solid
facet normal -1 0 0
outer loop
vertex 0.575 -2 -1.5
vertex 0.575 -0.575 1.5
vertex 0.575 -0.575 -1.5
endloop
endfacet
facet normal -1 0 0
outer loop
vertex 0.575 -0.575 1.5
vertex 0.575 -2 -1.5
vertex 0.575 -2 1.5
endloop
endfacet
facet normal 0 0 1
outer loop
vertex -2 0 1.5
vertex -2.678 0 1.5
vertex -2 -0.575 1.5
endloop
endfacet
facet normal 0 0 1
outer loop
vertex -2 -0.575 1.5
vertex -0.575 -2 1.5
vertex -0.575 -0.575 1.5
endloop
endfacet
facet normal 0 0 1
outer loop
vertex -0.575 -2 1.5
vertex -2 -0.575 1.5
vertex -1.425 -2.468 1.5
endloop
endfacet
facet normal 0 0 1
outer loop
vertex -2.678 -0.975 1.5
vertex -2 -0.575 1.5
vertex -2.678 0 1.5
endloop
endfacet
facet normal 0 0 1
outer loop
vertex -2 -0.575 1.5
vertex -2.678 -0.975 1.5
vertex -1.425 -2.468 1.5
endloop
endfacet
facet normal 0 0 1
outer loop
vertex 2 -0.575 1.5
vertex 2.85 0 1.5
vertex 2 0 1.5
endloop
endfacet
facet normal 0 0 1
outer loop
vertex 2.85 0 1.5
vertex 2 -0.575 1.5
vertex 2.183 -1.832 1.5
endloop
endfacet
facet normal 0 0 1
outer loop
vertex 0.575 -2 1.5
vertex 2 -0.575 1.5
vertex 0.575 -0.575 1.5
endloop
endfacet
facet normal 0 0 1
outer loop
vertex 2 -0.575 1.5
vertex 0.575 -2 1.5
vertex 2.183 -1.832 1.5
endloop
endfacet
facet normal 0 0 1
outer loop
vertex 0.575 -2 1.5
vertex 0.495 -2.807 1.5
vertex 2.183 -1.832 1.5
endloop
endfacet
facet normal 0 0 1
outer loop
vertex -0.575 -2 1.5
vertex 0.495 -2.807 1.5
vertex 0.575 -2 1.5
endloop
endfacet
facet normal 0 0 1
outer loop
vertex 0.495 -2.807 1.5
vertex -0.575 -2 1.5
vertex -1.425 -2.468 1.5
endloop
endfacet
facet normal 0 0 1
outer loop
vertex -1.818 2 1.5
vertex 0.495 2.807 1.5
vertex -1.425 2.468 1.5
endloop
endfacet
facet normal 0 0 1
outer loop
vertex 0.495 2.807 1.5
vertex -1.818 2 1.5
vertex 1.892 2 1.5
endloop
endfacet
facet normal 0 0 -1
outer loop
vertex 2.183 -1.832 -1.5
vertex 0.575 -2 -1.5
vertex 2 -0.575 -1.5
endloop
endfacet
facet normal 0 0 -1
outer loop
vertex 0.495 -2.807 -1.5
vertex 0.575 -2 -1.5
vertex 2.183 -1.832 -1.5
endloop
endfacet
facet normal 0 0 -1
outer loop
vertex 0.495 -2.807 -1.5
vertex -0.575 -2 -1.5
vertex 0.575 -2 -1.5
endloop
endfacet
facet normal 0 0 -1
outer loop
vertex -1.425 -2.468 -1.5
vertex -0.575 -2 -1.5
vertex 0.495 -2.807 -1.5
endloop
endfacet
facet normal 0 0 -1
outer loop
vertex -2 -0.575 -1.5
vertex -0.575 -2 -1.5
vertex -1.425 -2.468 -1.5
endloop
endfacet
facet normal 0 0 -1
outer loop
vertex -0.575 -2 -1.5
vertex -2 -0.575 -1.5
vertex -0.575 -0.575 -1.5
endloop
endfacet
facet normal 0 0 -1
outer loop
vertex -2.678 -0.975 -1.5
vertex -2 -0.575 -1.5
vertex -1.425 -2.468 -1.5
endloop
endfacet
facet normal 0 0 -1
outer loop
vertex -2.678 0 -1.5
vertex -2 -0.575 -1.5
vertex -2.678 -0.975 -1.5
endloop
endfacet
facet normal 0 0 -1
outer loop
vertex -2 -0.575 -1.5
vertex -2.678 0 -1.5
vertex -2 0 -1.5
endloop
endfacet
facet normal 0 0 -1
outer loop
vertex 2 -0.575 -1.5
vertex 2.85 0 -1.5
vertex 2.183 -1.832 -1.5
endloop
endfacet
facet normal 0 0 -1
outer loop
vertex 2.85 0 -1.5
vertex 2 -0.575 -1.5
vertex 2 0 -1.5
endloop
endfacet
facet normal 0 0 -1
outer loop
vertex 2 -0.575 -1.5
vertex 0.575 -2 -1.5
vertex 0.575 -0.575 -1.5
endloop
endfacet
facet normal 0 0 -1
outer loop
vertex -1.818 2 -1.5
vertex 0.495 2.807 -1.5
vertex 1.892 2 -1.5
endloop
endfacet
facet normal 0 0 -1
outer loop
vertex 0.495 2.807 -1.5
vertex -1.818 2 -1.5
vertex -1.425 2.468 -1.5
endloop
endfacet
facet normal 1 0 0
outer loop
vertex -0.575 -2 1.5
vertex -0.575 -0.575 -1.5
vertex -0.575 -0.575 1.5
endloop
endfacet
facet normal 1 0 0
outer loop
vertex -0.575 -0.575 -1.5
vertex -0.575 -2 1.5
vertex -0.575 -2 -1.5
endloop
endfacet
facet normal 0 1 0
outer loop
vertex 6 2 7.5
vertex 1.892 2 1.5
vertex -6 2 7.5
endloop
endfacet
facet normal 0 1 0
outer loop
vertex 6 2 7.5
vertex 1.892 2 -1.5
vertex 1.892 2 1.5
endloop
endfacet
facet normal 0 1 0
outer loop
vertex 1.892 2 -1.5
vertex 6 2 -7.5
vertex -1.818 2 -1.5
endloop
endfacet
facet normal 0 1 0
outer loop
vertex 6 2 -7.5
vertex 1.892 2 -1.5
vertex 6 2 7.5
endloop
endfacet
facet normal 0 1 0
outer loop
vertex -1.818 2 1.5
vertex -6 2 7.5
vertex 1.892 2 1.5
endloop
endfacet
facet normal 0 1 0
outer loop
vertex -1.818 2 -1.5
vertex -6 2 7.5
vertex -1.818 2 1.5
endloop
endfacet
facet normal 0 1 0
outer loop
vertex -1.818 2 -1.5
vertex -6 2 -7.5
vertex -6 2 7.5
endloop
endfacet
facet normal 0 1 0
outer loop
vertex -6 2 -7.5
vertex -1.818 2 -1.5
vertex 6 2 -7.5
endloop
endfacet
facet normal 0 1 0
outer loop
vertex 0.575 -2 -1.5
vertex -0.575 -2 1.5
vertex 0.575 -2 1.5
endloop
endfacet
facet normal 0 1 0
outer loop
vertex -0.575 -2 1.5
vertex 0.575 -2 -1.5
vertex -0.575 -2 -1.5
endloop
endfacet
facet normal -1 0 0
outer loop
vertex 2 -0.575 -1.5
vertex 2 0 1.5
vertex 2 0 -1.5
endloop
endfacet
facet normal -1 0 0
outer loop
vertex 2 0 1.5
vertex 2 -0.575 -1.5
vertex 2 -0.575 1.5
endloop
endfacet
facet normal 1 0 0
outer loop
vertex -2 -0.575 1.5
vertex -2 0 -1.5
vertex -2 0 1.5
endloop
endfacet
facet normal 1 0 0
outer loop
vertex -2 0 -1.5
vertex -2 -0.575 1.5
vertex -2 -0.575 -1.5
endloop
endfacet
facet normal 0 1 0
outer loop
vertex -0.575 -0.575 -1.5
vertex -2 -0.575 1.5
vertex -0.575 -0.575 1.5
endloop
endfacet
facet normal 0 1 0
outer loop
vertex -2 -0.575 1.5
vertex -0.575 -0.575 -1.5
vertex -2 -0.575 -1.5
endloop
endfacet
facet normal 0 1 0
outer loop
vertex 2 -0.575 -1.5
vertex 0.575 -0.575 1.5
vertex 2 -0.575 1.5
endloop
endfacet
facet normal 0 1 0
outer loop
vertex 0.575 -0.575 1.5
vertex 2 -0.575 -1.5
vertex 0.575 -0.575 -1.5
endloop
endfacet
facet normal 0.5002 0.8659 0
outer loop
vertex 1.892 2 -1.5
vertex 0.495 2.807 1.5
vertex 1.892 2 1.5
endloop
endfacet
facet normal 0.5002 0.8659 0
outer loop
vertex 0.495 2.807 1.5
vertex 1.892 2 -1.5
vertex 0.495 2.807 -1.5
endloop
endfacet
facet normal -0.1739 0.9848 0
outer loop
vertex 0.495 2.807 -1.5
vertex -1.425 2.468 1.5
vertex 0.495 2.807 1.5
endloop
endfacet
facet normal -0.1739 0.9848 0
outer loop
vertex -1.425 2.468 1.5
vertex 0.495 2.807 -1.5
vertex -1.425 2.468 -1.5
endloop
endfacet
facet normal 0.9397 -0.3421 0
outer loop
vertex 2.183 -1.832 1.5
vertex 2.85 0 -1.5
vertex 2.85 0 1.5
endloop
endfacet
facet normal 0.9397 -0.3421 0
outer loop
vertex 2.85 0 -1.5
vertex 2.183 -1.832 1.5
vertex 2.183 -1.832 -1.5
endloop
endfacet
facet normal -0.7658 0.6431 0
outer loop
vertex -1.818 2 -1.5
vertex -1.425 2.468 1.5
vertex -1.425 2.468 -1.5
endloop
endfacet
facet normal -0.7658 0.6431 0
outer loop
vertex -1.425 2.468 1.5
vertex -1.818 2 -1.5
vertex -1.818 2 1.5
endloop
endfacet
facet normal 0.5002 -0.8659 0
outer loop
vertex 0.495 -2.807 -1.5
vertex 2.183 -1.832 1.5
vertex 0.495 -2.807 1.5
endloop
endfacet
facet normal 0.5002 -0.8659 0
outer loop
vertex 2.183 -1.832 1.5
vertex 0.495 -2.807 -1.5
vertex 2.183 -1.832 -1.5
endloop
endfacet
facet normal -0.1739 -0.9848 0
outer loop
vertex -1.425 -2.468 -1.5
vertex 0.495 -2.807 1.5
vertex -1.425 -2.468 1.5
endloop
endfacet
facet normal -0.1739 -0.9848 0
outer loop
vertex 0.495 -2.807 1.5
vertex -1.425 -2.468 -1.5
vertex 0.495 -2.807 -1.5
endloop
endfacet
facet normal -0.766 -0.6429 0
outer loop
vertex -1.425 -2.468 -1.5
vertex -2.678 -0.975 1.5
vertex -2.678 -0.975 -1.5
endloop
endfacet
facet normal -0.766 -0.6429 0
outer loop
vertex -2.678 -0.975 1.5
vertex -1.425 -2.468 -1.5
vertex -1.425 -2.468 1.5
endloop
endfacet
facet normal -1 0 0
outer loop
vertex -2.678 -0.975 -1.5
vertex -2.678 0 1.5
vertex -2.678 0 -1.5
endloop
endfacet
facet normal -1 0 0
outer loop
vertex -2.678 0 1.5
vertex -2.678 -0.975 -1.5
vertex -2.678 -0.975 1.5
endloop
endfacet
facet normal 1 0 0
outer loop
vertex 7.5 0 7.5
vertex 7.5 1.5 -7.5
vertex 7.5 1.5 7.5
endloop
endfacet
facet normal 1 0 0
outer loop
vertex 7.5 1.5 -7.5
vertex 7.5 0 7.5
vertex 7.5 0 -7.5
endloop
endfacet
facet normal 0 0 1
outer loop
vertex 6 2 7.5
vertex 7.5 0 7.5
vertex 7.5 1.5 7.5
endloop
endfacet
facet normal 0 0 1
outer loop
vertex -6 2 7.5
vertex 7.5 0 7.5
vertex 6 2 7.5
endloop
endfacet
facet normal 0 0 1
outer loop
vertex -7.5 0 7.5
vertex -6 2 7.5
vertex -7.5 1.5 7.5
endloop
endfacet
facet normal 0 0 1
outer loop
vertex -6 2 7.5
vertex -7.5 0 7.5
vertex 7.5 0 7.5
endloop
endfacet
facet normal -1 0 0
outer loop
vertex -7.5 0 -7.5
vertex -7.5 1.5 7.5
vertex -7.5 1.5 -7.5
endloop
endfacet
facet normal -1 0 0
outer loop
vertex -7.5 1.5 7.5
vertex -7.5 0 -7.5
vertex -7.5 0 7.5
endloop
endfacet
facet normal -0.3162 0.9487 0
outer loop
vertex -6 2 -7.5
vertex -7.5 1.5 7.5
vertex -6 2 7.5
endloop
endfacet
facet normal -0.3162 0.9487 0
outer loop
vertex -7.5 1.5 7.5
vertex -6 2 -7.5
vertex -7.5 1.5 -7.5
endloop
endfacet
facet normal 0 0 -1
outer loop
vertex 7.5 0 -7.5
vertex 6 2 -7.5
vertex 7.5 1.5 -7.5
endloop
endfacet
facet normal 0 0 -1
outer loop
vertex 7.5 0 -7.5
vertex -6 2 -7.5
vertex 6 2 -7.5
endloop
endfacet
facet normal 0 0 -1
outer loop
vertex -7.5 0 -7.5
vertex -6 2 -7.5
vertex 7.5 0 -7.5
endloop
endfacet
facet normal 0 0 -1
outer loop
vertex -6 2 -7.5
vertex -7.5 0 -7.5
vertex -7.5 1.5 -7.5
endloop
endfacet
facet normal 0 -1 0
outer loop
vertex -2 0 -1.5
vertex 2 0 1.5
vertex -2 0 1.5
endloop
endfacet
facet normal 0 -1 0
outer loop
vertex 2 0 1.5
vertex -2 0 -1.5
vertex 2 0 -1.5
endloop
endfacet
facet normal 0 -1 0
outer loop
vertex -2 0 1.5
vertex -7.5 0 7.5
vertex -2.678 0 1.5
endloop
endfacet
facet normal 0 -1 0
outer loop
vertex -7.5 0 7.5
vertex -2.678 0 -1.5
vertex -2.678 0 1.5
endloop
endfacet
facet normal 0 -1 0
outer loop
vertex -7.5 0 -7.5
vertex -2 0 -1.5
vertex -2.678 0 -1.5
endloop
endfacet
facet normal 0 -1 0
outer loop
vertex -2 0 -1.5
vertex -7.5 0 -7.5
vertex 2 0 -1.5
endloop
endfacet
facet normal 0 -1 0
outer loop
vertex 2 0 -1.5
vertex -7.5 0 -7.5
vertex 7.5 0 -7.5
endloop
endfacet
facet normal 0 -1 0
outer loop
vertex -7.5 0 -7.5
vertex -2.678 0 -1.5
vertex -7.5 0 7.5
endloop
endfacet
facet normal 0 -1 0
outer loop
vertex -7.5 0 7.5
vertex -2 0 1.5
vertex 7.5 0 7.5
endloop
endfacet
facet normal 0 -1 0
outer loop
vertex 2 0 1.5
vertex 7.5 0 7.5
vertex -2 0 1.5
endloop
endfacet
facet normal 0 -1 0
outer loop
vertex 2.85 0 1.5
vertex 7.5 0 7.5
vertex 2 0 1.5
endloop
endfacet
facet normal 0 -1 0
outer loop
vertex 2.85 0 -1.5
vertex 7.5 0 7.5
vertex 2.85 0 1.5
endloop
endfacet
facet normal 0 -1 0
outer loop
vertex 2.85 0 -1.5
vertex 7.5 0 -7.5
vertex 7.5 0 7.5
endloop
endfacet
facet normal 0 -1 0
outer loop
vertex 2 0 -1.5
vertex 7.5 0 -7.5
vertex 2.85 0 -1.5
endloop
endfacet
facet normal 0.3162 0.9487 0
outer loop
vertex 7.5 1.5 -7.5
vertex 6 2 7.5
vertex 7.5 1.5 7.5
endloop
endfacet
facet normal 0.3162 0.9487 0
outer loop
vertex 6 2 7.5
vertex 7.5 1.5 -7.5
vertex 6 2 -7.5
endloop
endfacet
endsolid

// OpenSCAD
union () {
  difference () {
    cylinder (h=3, r=2.85, center=true);
    union () {
      cube ([1.15, 4.0, 3], center=true);
      cube ([4.0, 1.15, 3], center=true);
    }
  }
  linear_extrude (height=15, center=true){
    polygon (points=[[-7.5, 0], [-7.5, 1.5], [-6, 2], [6, 2], [7.5, 1.5], [7.5, 0]]);
  }
}
